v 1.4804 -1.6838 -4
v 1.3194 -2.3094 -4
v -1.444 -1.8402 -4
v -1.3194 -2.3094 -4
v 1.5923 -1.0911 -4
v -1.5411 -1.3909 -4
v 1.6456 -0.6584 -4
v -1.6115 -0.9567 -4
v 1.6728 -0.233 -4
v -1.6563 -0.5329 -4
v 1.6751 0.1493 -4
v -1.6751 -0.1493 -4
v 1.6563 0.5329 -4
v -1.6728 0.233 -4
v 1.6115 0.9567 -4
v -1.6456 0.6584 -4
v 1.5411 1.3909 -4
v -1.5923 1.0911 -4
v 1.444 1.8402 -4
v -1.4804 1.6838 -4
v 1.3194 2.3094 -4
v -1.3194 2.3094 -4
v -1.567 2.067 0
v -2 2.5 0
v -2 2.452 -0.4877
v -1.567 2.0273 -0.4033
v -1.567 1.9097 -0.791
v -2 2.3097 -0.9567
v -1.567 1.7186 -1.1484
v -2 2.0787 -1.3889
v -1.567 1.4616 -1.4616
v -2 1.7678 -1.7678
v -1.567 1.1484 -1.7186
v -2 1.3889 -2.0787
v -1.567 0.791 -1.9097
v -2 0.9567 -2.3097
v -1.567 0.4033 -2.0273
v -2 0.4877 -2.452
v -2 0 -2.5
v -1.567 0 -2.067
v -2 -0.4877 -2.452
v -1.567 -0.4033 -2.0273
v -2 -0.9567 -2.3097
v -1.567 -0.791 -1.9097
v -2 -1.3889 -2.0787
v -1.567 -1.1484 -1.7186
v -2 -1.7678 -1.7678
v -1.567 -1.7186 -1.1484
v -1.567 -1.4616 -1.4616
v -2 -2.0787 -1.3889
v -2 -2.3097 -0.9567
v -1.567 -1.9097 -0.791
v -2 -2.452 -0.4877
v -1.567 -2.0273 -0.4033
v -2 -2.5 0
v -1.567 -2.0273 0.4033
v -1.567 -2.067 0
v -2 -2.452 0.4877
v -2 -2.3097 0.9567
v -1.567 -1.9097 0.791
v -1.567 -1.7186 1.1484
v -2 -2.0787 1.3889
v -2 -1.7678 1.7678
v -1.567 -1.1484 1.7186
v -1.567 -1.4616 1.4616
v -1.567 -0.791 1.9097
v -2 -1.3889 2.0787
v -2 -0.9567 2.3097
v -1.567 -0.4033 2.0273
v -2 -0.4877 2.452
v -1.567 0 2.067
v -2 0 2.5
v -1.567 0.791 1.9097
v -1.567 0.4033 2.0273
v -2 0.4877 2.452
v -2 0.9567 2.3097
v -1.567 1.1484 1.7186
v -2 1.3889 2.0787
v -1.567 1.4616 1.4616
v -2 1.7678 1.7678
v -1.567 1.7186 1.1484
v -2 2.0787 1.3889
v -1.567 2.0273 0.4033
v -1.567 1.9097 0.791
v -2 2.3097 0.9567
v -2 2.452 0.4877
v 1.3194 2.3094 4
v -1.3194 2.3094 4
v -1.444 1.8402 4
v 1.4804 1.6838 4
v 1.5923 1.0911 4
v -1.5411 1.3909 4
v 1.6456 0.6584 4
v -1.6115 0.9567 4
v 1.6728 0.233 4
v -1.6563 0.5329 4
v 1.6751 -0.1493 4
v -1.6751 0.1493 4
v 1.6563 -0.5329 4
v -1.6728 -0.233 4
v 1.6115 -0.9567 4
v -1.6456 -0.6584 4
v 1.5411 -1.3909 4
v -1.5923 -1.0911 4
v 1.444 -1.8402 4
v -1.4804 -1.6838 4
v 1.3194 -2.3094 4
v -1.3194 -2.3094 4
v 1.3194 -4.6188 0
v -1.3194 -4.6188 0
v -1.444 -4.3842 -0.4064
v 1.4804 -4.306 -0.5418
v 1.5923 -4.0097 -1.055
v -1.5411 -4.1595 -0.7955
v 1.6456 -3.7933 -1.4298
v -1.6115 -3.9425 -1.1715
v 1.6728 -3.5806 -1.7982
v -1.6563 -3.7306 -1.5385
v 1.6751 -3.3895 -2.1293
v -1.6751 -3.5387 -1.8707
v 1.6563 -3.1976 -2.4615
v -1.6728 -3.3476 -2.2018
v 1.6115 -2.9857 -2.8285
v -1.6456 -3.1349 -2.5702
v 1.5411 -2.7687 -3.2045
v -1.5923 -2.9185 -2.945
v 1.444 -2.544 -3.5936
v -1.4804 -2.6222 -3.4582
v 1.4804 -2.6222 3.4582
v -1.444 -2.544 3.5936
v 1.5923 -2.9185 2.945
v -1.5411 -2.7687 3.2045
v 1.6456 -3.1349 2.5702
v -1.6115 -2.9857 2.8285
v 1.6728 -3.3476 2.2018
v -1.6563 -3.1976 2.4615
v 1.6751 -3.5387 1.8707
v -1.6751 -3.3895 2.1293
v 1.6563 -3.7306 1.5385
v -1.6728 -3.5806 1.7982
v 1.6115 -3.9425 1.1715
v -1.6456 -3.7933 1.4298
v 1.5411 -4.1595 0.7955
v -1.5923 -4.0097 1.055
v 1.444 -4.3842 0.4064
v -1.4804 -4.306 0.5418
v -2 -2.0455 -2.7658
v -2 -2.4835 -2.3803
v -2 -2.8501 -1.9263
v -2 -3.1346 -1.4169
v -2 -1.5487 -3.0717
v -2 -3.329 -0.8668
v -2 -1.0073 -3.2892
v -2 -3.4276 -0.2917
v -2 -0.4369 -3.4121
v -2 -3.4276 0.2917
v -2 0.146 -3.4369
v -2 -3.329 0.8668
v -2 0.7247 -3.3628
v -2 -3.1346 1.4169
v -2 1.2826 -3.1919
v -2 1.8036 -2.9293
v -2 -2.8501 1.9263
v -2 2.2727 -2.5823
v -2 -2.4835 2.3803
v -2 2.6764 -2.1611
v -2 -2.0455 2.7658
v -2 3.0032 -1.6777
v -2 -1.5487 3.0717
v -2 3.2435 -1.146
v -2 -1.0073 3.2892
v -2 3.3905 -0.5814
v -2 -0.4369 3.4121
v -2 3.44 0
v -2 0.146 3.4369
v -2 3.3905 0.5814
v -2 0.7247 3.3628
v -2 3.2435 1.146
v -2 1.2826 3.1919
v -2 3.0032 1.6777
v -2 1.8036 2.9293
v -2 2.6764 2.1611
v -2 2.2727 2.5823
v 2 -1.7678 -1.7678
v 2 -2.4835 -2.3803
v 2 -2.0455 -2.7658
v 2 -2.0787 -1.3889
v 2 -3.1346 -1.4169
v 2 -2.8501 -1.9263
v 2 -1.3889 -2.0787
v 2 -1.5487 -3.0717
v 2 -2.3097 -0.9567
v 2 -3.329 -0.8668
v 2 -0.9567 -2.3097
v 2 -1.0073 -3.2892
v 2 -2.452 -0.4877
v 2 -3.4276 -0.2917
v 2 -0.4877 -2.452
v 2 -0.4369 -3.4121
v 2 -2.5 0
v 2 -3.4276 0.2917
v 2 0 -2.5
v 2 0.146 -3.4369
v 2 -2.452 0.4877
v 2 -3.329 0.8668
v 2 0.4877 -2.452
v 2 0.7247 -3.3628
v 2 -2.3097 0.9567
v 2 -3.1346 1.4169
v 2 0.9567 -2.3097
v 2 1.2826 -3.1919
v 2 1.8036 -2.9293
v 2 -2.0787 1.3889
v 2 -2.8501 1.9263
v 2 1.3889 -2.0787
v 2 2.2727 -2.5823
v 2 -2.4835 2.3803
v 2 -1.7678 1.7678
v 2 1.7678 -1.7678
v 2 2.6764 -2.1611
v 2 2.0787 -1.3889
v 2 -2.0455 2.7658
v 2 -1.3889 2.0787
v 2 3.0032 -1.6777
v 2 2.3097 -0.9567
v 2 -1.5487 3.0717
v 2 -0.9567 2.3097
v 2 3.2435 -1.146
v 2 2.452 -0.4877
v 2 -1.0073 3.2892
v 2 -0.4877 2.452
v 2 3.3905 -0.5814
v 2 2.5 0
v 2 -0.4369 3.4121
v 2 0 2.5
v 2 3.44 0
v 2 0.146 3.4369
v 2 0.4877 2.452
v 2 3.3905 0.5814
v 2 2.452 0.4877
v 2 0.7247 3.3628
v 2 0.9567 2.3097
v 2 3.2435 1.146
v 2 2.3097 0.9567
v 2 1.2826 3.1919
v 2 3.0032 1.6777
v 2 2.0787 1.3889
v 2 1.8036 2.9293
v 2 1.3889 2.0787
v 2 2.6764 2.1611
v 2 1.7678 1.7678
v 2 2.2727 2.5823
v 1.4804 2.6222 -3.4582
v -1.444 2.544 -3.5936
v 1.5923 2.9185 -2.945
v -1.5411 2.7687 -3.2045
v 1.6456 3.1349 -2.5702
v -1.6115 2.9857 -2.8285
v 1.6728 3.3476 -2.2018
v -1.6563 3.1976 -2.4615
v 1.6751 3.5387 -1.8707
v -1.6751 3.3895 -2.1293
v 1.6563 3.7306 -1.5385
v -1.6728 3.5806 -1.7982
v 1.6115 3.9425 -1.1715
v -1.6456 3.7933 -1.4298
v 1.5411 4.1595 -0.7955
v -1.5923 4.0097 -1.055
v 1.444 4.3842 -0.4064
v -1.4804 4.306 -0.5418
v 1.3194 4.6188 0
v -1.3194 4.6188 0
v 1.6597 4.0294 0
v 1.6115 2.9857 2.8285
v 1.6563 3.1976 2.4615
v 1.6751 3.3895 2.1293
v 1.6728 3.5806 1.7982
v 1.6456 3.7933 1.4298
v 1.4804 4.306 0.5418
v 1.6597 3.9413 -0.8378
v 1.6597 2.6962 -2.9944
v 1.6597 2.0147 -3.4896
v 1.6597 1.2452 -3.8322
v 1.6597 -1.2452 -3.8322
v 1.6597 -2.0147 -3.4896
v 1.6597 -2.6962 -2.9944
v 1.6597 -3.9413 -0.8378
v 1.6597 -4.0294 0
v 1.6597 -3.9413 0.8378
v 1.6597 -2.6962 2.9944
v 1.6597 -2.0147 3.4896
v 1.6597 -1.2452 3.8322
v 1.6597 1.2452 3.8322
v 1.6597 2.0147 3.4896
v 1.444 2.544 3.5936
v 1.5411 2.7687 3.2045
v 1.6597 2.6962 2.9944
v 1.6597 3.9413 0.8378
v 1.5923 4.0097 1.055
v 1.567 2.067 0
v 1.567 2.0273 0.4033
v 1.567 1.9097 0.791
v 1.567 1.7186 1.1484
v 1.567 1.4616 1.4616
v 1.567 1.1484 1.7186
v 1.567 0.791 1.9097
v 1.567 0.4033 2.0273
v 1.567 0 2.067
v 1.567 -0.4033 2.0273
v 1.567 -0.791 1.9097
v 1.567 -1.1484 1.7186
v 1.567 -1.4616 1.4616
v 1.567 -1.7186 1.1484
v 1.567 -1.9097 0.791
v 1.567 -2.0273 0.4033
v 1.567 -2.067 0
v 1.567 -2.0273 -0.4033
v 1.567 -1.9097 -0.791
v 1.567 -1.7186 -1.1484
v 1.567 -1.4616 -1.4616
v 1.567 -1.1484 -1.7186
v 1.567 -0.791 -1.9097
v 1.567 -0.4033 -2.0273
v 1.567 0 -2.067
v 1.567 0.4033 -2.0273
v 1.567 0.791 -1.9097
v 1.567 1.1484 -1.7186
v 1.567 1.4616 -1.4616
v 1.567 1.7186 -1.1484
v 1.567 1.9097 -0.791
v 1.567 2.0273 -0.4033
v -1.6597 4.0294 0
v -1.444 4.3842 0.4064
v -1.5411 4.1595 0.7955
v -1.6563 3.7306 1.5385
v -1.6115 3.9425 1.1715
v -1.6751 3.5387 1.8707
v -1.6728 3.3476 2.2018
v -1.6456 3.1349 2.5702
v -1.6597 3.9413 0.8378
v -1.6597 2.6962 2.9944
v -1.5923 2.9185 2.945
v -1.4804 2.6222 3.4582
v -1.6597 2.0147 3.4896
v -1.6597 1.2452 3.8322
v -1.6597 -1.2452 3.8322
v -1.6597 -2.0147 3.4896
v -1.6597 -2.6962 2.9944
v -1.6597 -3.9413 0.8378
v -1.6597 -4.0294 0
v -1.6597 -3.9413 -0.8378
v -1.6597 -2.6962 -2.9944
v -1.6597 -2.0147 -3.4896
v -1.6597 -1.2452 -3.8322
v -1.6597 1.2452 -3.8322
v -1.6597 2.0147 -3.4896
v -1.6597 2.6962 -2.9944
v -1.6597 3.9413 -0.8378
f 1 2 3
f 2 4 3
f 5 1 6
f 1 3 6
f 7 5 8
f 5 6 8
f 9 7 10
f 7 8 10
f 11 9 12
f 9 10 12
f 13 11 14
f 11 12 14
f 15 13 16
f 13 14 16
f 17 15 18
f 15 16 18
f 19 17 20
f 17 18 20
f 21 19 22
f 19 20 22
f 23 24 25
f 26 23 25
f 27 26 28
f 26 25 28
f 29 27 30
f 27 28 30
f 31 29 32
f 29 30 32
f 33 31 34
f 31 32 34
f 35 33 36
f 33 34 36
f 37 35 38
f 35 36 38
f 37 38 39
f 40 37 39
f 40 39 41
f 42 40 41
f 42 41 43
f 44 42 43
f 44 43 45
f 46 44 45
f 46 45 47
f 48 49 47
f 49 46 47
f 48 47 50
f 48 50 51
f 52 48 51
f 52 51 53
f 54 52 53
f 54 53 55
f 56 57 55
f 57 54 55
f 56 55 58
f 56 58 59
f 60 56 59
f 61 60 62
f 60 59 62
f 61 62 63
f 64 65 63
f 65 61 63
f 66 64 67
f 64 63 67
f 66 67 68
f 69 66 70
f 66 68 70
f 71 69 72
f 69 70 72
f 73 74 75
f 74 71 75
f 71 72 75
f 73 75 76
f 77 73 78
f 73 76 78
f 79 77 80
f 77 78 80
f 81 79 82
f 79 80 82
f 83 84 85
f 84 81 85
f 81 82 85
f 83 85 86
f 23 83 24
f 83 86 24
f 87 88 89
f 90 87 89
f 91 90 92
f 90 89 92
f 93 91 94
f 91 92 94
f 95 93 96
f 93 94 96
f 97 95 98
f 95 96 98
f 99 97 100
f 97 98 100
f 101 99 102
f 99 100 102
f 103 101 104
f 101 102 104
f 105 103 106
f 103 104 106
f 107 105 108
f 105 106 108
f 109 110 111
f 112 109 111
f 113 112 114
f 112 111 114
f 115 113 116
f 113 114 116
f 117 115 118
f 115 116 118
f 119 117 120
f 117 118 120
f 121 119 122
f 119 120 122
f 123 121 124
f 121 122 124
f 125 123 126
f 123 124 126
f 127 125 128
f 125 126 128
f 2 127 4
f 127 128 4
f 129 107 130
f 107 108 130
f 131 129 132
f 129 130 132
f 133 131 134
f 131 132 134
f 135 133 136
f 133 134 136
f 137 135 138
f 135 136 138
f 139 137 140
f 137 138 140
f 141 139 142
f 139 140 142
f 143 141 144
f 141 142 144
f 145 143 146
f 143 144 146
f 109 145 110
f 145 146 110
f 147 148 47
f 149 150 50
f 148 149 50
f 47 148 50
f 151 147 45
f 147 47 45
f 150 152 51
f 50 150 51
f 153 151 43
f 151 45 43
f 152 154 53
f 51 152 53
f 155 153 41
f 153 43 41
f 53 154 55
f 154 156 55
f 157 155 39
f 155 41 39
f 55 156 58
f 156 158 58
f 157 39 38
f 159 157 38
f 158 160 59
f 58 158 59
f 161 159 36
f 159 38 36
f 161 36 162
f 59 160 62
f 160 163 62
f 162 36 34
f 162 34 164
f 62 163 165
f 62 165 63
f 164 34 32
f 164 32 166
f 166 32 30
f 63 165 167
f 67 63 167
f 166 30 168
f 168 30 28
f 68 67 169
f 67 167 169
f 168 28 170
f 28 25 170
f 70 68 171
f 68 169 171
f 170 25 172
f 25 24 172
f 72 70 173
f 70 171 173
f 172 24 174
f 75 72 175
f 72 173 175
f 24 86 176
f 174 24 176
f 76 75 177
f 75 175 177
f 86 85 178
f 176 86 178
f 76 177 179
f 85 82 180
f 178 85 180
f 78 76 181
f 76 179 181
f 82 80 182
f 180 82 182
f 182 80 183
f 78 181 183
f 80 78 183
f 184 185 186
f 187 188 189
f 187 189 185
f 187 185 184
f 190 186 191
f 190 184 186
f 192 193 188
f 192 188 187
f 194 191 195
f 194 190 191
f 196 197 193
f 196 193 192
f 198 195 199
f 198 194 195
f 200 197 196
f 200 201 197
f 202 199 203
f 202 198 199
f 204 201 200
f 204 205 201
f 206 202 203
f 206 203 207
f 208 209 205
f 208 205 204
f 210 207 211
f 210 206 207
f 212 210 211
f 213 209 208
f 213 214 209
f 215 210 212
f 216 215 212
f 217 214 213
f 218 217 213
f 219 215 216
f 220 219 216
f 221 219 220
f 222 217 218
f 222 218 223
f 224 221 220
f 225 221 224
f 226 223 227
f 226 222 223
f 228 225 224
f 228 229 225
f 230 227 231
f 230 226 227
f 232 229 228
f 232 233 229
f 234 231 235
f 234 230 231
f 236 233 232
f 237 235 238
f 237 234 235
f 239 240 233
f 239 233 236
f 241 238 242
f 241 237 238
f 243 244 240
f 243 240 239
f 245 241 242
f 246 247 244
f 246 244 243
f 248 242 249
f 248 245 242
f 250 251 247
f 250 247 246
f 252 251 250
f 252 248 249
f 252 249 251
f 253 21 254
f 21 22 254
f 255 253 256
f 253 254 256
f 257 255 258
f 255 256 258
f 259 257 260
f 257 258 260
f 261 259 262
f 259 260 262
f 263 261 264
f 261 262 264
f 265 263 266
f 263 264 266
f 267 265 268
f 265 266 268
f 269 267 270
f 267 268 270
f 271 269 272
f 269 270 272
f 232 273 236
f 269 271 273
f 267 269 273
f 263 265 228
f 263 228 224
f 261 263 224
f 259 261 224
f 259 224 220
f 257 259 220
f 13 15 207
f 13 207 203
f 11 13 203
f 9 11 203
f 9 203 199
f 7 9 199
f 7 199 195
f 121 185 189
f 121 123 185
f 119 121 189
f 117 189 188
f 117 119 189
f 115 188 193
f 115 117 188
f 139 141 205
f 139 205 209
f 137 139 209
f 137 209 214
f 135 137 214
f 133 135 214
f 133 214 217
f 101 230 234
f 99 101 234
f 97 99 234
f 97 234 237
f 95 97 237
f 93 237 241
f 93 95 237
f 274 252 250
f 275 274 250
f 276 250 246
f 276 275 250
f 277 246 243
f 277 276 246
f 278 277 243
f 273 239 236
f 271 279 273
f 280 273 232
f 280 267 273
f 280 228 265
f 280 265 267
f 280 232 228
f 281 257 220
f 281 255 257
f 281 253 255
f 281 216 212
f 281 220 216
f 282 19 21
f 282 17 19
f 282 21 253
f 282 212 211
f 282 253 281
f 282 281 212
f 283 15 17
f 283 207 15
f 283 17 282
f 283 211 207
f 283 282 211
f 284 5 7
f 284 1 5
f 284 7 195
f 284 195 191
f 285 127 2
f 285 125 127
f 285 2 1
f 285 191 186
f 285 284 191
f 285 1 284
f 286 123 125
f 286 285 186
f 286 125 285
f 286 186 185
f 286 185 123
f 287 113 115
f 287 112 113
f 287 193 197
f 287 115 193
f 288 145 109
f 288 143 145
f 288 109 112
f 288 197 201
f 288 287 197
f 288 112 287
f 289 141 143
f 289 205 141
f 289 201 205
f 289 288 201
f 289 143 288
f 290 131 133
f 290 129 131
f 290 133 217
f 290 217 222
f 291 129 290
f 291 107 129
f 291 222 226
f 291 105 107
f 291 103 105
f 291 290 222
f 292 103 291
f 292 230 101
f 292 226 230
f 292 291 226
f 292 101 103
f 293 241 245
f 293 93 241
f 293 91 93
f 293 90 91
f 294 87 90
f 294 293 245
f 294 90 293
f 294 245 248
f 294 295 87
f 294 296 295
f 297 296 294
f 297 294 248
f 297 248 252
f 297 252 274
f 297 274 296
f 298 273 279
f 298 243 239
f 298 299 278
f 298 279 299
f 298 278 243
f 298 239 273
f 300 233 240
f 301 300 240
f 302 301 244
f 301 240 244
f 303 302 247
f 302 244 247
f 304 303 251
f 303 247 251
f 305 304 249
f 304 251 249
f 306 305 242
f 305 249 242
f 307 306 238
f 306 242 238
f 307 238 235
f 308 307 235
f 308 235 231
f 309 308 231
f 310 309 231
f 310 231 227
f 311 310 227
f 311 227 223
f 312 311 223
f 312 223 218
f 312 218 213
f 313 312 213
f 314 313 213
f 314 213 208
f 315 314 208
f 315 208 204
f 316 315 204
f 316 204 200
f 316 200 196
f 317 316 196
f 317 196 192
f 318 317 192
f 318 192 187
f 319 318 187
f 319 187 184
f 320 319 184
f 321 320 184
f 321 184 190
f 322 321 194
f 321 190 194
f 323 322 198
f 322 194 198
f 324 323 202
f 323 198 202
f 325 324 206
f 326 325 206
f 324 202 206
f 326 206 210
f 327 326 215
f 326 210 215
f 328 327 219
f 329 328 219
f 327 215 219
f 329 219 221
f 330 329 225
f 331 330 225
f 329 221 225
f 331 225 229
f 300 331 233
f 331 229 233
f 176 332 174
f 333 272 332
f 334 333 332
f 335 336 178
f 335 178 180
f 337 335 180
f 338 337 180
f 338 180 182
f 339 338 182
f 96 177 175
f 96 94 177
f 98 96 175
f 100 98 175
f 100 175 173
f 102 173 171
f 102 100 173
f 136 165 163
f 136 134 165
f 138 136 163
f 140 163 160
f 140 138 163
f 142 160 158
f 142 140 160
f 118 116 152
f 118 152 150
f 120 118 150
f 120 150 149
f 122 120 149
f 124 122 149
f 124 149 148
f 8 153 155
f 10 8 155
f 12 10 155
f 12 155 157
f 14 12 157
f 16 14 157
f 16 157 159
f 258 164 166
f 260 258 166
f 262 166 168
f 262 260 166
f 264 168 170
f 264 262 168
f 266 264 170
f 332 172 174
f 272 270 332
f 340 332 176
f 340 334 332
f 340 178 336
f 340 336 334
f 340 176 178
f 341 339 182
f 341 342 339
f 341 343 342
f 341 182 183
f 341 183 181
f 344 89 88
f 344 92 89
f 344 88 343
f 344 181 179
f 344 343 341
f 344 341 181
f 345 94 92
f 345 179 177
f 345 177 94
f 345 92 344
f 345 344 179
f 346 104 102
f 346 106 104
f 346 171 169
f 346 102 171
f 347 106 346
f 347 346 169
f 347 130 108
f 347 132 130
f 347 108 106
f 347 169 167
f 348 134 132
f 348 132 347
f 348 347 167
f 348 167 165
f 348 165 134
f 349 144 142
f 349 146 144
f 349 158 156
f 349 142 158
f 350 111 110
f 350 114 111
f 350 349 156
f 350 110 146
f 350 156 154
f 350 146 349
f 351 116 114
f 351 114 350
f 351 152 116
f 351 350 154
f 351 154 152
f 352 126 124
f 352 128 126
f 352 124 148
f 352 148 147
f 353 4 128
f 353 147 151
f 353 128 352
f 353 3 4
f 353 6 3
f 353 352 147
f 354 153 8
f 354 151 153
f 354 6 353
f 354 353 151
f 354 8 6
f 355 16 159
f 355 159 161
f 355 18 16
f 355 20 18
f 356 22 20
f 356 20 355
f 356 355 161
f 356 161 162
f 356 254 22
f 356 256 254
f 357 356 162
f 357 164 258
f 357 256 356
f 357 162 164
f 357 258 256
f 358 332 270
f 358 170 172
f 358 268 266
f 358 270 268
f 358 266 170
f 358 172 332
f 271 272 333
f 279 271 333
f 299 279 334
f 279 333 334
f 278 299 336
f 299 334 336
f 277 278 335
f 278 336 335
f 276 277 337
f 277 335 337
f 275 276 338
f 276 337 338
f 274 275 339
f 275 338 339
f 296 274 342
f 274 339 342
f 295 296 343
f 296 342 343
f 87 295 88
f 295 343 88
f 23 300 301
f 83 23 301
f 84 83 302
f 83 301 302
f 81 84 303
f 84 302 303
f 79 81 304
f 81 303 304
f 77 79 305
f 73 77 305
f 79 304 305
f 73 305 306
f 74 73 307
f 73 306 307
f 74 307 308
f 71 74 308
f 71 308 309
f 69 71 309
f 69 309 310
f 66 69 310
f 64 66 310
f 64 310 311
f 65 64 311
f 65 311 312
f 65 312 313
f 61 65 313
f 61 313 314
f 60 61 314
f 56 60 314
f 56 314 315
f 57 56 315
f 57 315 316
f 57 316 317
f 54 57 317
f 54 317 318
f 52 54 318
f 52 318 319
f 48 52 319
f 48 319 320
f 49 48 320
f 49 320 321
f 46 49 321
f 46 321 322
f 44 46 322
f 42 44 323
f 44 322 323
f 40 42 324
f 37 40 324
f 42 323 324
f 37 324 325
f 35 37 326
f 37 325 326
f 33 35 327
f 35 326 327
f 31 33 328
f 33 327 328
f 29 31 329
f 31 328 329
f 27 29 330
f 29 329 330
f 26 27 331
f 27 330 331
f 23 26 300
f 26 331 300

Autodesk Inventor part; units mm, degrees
sketch "B" plane through (0, 0, 0) normal (1, 0, 0) x (0, 1, 0)
  line L0 (-2.3094, 4) -> (-4.6188, 0)
  line L1 (-4.6188, 0) -> (-2.3094, -4)
  line L2 (-2.3094, -4) -> (2.3094, -4)
  line L3 (2.3094, -4) -> (4.6188, 0)
  line L4 (4.6188, 0) -> (2.3094, 4)
  line L5 (2.3094, 4) -> (-2.3094, 4)
extrude "Extrusion1" add sketch "B" along normal mid plane 4
sketch "Sketch_2" plane through (0, 0, 0) normal (0, 0, 1) x (1, 0, 0)
  line L0 (2, 0) -> (-2, 0)
  line L1 (-2, 0) -> (-2, 2.5)
  line L2 (-2, 2.5) -> (-1.567, 2.067)
  line L3 (-1.567, 2.067) -> (1.567, 2.067)
  line L4 (1.567, 2.067) -> (2, 2.5)
  line L5 (2, 2.5) -> (2, 0)
  line L6 (2, 0) -> (-2, 0)
revolve "Revolution1" cut sketch "Sketch_2" angle 360 about axis through (2, 0, 0) along (1, 0, 0)
thread "Thread1" size "M5x0.8" class "6H" standard "ISO Metric profile" full length
sketch "Sketch_3" plane through (0, 0, 0) normal (0, 0, 1) x (1, 0, 0)
  line L0 (50, 0) -> (-50, 0)
  line L1 (-7, 1) -> (-2, 1)
  line L2 (-2, 1) -> (-2, 3.44)
  line L3 (-2, 3.44) -> (0, 6.9041)
  line L4 (0, 6.9041) -> (2, 3.44)
  line L5 (2, 3.44) -> (2, 1)
  line L6 (2, 1) -> (7, 1)
  line L7 (7, 1) -> (7, 8.44)
  line L8 (7, 8.44) -> (-7, 8.44)
  line L9 (-7, 8.44) -> (-7, 1)
revolve "Revolution2" cut sketch "Sketch_3" angle 360 about axis through (50, 0, 0) along (1, 0, 0)
ref_plane "nt_XY" through (0, 0, 0) normal (1, 0, 0) x (0, 0, -1)
ref_plane "nt_YZ" through (0, 0, 0) normal (0, 0, -1) x (0, 1, 0)
ref_plane "nt_ZX" through (0, 0, 0) normal (0, 1, 0) x (1, 0, 0)
ref_plane "ntj_XY" through (2, 0, 0) normal (1, 0, 0) x (0, 0, -1)
ref_plane "ntj_YZ" through (2, 0, 0) normal (0, 0, -1) x (0, 1, 0)
ref_plane "ntj_ZX" through (2, 0, 0) normal (0, 1, 0) x (1, 0, 0)
properties part number "NTJ-015C"
